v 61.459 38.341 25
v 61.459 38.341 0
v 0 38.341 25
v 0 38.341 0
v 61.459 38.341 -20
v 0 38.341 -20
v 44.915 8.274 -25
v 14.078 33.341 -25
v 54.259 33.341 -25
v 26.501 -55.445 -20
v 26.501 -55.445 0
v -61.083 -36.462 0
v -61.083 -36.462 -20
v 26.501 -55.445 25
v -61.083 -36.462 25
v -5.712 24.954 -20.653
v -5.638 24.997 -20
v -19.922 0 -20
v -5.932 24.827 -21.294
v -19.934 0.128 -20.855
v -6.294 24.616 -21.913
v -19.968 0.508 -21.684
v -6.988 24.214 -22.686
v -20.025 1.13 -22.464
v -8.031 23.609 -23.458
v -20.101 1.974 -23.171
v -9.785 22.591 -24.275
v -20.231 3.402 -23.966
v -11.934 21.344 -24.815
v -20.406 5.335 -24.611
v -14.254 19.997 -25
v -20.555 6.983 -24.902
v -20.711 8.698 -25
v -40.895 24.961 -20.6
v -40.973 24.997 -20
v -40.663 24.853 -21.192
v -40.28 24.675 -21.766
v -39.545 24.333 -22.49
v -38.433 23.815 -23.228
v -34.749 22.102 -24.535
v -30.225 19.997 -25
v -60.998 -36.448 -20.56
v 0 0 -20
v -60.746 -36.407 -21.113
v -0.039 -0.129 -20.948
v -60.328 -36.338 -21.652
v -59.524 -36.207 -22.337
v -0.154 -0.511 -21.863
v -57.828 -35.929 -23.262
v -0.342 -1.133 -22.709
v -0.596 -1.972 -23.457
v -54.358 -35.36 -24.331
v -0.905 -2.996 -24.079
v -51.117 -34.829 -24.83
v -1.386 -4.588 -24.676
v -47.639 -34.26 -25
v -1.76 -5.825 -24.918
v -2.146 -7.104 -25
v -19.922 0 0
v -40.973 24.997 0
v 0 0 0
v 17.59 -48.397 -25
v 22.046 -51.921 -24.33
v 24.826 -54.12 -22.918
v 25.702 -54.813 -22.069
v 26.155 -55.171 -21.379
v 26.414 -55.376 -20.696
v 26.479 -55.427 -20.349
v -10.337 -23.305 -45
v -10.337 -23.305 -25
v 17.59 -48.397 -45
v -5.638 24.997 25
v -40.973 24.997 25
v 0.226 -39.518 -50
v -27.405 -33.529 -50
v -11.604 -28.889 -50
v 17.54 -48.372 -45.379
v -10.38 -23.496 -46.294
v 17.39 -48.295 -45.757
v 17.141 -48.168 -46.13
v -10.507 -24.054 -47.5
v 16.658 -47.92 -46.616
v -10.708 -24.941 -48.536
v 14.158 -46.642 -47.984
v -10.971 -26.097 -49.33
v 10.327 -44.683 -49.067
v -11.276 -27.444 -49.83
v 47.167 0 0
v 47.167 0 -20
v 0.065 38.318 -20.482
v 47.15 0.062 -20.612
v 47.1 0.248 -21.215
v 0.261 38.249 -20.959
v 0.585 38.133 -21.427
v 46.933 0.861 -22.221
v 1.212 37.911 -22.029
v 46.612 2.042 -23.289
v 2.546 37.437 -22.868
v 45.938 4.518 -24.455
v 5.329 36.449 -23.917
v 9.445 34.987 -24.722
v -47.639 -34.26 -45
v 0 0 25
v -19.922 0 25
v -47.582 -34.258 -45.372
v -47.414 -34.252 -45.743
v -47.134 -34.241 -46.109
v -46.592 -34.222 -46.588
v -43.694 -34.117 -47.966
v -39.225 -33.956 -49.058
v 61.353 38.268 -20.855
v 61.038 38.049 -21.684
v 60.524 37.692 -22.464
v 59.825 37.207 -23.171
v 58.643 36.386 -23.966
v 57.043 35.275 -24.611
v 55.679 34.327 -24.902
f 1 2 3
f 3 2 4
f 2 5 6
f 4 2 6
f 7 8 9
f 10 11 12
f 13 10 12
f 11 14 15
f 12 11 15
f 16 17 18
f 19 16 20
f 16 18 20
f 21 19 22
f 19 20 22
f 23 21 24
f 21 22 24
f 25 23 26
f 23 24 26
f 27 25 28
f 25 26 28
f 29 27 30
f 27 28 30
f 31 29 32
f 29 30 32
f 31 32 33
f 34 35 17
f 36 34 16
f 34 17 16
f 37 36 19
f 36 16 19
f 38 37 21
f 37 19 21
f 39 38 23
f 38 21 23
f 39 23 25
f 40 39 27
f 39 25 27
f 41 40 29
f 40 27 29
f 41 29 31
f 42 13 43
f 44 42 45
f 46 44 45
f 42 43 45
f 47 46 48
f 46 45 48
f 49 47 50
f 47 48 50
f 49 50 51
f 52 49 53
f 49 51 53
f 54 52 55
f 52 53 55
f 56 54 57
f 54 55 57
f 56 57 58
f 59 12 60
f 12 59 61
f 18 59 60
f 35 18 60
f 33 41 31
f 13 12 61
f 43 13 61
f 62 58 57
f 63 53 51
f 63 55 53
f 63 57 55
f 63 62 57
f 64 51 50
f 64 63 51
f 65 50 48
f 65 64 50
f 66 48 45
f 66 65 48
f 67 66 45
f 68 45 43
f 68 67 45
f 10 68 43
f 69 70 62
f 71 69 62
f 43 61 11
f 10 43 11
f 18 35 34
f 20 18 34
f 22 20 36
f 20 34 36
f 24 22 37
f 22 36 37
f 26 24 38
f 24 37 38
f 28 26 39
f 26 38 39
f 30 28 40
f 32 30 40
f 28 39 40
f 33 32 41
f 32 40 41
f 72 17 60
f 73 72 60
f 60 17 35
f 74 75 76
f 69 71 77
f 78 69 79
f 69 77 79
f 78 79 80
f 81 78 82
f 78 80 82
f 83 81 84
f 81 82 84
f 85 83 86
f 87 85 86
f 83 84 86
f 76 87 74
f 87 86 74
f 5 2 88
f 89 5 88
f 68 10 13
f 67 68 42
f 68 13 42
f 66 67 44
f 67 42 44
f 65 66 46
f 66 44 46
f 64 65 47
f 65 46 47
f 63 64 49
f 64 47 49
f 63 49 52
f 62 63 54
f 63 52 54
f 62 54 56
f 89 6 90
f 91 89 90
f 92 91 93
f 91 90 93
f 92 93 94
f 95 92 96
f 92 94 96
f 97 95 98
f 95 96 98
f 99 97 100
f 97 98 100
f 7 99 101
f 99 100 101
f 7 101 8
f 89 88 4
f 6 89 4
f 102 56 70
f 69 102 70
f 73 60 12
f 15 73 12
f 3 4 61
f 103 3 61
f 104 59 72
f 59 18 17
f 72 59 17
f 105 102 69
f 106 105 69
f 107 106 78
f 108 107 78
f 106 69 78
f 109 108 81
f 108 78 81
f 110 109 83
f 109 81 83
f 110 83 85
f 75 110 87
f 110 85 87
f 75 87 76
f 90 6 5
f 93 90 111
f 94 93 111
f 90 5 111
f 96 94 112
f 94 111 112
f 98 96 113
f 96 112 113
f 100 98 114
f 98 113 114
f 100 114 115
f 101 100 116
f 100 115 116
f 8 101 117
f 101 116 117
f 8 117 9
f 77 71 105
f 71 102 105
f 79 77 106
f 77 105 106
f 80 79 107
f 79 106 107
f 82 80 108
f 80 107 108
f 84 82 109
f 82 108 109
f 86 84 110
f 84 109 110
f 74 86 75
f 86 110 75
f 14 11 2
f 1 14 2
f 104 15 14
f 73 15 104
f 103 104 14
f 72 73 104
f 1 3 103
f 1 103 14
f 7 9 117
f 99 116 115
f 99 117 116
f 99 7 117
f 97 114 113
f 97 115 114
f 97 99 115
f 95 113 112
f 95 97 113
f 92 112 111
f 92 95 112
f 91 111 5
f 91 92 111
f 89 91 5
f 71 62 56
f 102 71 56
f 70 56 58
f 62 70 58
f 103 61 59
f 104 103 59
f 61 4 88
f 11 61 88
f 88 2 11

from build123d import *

# Parameters (mm, degrees)
F1_DEPTH = 25
F3_DEPTH = 25
F4_R     = 5
F5_R     = 5
F6_R     = 5
F8_DEPTH = 25
F9_R     = 5


with BuildPart() as f1:
    # F0 (on Top) → F1 (new body)
    with BuildSketch(Plane.XY):
        Polygon((0, 38.341291), (0, 0), (-19.922435, 0), (-5.638425, 24.997016), (-40.972557, 24.997016), (-61.082937, -36.461815), (26.500596, -55.444513), (61.458834, 38.341291), align=None)
    extrude(amount=F1_DEPTH)

    # F2 (on face) → F3 (join)
    with BuildSketch(Plane(origin=(0, 0, 0), x_dir=(1, 0, 0), z_dir=(0, 0, -1))):
        Polygon((26.500596, 55.444513), (-61.082937, 36.461815), (0, 0), align=None)
        Polygon((-5.638425, -24.997016), (-19.922435, 0), (-40.972557, -24.997016), align=None)
        Polygon((61.458834, -38.341291), (47.167289, 0), (0, -38.341291), align=None)
    extrude(amount=F3_DEPTH)

    # F4
    f4_edges = [f1.edges().sort_by_distance(p)[0] for p in [
        (-30.541468, -18.230908, -25),
        (13.250298, -27.722256, -25),
        (-17.291171, -45.953164, -25),
    ]]
    fillet(f4_edges, radius=F4_R)

    # F5
    f5_edges = [f1.edges().sort_by_distance(p)[0] for p in [
        (-23.305491, 24.997016, -25),
        (-30.447496, 12.498508, -25),
        (-12.78043, 12.498508, -25),
    ]]
    fillet(f5_edges, radius=F5_R)

    # F6
    f6_edges = [f1.edges().sort_by_distance(p)[0] for p in [
        (30.729417, 38.341291, -25),
        (54.313061, 19.170646, -25),
        (23.583645, 19.170646, -25),
    ]]
    fillet(f6_edges, radius=F6_R)

    # F7 (on face) → F8 (join)
    with BuildSketch(Plane(origin=(0, 0, -25), x_dir=(1, 0, 0), z_dir=(0, 0, -1))):
        Polygon((17.59047, 48.397257), (-47.638593, 34.259627), (-10.337112, 23.305491), align=None)
    extrude(amount=F8_DEPTH)

    # F9
    f9_edges = [f1.edges().sort_by_distance(p)[0] for p in [
        (-28.987853, -28.782559, -50),
        (-15.024061, -41.328442, -50),
        (3.626679, -35.851374, -50),
    ]]
    fillet(f9_edges, radius=F9_R)


solid = f1.part
